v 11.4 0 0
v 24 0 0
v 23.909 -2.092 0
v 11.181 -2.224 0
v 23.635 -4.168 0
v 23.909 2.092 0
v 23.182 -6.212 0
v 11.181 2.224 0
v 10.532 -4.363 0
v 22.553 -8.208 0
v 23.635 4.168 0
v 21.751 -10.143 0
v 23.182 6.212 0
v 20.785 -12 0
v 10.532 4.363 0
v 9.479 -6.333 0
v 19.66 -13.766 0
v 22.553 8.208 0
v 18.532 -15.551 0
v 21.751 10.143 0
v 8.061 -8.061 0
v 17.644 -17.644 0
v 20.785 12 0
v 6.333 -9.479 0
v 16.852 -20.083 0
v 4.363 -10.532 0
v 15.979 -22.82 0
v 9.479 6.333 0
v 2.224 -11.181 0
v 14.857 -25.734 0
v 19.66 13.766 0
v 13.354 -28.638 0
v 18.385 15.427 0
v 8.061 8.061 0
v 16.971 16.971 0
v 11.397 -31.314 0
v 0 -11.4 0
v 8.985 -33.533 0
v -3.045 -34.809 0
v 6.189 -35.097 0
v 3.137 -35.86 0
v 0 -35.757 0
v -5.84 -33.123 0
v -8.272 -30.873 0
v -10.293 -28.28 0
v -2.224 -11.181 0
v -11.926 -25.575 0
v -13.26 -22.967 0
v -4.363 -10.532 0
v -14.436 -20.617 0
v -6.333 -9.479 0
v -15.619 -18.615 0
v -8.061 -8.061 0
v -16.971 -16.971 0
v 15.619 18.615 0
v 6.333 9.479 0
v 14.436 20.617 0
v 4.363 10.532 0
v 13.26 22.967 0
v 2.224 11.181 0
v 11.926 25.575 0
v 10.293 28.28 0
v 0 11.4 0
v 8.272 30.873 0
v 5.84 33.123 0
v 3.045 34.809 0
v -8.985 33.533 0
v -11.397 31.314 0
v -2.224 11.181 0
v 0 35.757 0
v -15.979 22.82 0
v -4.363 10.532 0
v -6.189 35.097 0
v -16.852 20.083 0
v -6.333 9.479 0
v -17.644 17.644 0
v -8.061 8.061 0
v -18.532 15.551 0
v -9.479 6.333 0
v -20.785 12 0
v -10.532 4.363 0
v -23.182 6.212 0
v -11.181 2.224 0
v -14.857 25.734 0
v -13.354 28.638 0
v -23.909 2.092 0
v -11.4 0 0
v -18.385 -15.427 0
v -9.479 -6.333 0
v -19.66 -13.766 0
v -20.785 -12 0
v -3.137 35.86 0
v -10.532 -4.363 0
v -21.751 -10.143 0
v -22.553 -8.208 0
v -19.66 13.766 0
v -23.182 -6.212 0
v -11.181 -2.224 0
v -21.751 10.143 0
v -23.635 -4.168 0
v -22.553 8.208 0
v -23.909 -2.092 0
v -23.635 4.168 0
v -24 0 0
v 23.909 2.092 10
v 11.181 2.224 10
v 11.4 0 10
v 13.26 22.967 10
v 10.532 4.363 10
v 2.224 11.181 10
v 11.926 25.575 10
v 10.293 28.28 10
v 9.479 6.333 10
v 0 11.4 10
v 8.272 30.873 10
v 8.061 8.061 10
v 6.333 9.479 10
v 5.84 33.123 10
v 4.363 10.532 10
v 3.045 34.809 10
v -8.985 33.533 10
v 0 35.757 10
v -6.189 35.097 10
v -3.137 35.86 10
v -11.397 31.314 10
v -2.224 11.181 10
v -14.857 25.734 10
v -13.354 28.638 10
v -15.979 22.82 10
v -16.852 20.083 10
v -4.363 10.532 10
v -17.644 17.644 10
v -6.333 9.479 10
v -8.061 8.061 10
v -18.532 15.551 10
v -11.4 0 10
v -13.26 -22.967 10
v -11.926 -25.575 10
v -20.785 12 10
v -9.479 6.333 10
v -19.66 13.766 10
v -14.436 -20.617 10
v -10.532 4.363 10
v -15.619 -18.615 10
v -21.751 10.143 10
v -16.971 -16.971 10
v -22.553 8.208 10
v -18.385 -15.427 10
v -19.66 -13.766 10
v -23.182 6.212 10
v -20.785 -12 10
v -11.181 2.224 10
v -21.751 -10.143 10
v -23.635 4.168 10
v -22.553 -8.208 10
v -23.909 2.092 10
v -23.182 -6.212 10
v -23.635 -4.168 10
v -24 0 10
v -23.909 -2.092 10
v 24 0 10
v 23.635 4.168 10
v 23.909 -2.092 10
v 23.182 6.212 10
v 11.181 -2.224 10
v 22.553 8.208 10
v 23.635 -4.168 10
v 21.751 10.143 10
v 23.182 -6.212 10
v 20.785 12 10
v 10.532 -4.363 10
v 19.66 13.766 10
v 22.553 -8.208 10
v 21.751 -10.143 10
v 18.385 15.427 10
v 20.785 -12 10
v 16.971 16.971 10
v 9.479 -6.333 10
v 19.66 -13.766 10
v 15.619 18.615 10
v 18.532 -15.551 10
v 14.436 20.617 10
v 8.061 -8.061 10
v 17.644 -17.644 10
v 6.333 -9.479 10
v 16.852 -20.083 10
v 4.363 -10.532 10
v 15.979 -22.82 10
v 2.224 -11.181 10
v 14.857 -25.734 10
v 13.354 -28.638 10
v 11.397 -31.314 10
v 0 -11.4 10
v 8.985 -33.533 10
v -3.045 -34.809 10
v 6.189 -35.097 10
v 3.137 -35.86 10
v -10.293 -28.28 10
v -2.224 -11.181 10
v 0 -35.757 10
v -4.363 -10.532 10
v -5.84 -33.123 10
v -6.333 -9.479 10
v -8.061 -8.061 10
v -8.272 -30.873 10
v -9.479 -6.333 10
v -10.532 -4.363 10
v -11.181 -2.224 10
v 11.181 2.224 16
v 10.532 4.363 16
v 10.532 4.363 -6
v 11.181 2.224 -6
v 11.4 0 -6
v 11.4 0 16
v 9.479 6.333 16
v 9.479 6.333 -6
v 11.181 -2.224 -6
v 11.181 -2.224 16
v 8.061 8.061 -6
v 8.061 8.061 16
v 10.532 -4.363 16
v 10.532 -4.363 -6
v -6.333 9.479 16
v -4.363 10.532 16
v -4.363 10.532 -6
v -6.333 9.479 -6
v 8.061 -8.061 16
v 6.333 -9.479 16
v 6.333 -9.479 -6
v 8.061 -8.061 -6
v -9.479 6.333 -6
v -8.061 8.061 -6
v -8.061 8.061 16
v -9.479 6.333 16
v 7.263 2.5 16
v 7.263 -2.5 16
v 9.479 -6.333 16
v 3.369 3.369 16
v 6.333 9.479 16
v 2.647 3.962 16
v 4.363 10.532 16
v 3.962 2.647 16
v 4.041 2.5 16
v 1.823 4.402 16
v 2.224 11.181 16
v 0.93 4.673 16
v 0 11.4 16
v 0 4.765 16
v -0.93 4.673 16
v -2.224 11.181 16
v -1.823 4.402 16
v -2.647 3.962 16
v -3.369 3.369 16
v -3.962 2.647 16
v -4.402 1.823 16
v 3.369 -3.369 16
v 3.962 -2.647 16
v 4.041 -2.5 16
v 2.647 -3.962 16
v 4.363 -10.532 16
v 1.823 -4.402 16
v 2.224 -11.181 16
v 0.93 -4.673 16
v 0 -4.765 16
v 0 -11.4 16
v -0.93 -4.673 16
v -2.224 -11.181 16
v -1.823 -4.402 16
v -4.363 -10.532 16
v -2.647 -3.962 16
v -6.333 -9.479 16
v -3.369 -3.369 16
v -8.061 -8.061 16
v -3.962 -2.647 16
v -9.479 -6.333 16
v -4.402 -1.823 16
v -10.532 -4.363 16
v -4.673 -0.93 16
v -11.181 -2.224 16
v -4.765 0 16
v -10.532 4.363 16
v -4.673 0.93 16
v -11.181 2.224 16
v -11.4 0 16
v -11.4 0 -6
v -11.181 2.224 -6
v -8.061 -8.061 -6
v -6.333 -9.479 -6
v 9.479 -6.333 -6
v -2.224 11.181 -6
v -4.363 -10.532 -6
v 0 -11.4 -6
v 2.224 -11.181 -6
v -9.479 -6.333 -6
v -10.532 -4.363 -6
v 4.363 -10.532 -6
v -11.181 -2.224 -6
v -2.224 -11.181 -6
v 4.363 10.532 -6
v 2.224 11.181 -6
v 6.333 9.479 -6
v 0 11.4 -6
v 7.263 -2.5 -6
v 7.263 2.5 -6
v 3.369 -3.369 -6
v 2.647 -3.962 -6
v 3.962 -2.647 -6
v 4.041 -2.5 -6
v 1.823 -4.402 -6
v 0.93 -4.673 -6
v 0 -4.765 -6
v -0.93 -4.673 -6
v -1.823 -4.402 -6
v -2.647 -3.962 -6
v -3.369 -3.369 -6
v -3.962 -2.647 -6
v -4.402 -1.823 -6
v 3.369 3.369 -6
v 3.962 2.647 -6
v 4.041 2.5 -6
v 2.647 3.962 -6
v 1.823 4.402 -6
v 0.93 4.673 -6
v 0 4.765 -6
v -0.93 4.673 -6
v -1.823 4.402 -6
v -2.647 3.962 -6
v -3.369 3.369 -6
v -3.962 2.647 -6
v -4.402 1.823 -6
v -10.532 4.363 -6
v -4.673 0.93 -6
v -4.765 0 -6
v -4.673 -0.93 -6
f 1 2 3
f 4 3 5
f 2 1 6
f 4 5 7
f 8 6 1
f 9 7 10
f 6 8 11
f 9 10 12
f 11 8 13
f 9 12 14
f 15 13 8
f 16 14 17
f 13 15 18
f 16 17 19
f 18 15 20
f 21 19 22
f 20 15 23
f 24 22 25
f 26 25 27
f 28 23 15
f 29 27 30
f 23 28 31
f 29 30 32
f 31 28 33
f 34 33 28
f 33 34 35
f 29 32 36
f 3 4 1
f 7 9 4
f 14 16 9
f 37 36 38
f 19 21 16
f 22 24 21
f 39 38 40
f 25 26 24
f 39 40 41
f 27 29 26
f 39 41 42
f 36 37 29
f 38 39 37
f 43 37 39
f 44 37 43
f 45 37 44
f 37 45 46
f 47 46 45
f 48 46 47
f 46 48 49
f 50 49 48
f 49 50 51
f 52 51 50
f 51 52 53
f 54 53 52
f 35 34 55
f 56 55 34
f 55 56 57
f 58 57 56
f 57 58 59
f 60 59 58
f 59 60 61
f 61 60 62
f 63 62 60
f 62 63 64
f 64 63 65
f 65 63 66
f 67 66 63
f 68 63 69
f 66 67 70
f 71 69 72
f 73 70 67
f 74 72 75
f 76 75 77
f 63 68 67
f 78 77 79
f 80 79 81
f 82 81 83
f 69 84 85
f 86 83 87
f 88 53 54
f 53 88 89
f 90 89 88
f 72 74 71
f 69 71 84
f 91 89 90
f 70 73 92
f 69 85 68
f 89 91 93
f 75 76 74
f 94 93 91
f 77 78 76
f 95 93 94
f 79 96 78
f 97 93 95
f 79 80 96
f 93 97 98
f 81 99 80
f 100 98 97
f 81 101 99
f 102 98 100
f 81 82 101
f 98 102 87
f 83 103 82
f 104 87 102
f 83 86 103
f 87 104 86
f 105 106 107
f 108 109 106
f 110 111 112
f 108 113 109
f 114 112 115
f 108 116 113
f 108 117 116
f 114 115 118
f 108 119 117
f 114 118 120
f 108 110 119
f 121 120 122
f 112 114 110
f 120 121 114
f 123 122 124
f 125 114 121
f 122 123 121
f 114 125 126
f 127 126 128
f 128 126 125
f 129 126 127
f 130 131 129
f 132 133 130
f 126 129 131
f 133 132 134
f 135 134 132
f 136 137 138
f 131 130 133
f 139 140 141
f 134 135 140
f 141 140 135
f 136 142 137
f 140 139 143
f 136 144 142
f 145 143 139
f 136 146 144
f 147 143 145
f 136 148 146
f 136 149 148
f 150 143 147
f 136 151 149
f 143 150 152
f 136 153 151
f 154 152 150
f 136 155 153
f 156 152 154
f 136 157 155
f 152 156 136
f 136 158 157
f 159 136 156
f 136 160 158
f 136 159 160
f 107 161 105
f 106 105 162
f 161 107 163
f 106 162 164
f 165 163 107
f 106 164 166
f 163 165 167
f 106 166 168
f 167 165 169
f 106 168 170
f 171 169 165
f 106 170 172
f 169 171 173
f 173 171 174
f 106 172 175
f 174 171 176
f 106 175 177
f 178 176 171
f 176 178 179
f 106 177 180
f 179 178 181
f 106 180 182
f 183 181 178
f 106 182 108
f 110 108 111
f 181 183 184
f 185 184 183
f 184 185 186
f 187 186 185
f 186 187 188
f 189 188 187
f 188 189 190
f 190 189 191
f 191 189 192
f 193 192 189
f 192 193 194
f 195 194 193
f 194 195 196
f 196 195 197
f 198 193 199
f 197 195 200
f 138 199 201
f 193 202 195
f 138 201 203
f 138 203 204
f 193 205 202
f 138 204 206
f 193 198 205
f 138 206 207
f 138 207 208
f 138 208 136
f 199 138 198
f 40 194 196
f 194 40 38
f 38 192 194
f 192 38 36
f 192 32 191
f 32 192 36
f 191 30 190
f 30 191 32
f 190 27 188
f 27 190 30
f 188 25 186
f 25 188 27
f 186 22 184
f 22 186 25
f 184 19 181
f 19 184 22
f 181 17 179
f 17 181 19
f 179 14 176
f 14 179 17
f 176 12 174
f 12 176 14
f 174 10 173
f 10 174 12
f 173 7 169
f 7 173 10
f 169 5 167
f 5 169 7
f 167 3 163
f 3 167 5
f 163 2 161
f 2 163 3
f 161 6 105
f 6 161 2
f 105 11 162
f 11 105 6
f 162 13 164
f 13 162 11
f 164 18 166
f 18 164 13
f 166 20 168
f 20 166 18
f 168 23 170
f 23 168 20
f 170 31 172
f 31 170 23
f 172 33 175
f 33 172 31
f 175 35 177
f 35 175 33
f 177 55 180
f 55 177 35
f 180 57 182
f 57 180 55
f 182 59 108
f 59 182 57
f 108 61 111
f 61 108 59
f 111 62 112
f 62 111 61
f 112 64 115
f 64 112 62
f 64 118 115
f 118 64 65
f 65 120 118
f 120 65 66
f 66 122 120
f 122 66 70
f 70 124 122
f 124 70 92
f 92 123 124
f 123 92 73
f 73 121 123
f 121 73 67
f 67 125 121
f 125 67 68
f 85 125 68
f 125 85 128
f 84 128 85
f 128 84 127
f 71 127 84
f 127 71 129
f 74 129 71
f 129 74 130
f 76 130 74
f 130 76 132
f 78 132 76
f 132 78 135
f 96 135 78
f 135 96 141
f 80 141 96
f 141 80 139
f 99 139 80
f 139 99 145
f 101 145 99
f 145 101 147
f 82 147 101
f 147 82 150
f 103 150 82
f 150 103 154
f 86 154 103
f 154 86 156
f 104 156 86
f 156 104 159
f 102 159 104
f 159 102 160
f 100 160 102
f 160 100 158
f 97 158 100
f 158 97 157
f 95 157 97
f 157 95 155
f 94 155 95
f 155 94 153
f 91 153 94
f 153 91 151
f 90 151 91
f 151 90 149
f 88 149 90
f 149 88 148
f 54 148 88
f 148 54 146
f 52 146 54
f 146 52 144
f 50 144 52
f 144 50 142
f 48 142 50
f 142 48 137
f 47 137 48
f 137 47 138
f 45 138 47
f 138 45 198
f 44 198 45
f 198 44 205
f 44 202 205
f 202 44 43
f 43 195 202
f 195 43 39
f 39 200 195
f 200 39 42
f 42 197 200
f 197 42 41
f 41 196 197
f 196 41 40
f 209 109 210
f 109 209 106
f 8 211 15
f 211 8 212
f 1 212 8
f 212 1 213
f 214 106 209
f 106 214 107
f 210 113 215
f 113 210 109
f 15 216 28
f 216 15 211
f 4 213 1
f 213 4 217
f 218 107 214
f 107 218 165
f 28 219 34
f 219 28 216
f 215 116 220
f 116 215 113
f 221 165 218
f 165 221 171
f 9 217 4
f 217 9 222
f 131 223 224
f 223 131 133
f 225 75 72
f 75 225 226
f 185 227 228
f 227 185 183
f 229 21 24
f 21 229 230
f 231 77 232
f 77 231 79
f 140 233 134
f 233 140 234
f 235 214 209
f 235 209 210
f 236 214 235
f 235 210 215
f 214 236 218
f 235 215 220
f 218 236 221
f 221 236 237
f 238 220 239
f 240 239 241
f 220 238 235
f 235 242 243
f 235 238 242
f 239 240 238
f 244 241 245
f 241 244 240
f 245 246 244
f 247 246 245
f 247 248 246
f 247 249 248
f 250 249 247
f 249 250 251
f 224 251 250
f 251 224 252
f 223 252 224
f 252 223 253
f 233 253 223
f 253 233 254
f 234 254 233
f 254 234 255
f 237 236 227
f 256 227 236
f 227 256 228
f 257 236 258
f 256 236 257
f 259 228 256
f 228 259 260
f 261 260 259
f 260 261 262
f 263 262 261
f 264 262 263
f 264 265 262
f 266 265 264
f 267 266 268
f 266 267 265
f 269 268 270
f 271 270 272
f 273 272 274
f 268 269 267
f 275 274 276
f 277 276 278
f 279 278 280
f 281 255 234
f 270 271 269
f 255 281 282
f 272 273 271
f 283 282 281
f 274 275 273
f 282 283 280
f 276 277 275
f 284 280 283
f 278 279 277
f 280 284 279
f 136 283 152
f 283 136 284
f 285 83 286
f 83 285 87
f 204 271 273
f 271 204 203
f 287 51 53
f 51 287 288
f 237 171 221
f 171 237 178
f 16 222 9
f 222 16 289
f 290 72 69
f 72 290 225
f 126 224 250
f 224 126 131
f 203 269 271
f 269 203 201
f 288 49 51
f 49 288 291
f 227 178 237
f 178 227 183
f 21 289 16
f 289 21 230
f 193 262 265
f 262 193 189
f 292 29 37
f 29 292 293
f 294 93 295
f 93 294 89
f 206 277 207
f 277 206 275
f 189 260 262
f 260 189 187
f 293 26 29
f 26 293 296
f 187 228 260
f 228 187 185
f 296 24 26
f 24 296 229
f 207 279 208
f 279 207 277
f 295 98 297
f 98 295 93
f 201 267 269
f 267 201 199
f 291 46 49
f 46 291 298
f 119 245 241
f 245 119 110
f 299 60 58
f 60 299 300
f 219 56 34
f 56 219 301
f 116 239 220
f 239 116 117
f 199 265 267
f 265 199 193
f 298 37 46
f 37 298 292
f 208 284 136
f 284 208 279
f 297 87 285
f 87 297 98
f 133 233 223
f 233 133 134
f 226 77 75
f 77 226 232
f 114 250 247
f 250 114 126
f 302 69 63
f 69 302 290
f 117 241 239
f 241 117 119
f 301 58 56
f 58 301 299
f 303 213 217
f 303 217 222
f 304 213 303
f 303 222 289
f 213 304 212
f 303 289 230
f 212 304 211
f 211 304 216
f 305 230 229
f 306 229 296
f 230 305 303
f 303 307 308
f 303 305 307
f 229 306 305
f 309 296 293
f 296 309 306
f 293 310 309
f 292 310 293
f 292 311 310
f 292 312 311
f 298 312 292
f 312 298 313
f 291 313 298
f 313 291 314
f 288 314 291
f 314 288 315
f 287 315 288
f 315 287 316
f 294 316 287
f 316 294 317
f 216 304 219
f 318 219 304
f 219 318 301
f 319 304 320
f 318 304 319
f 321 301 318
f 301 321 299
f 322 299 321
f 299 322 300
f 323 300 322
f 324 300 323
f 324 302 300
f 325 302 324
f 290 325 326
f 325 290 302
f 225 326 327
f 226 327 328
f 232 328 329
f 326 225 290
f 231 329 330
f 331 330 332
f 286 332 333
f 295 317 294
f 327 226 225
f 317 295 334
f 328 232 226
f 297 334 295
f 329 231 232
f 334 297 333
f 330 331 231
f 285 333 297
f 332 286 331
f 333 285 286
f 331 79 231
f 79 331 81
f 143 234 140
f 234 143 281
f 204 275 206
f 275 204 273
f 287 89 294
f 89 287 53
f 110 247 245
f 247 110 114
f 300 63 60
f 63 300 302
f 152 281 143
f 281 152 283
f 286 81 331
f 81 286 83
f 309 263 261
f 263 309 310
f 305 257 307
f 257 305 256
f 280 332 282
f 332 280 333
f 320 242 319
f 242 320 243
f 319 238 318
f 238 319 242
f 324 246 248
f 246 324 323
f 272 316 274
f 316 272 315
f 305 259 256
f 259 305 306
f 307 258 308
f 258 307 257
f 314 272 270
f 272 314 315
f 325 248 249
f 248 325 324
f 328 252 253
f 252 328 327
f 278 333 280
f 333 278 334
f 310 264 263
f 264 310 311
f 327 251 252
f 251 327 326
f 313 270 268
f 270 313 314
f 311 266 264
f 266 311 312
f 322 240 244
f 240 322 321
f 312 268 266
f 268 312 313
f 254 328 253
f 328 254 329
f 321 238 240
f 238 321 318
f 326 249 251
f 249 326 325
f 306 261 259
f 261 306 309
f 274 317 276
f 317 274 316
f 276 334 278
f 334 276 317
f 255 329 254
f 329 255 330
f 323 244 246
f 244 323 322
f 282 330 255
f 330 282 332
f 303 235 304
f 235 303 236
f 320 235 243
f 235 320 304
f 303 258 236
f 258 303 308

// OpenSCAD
$fn = 32;

// ----------------------------------------------------------------------
// Cam: base radius 24 mm with a 12 mm lift over 180 degrees
// ----------------------------------------------------------------------

// --- parameters (mm) ---
base_r = 24;              // base radius
lift = 12;                // lift height above the base radius
lift_span = 180;          // angular width of the lift
lift_start = 45;          // angle where the lift starts
cam_t = 10;               // cam plate thickness
hub_d = 22.8;             // hub diameter
hub_h = 22;               // hub height
bore_d = 9.53;            // bore
key_w = 5;                // keyway width
key_depth = 2.5;          // keyway depth

cam_profile = [[24, 0], [23.909, 2.092], [23.635, 4.168], [23.182, 6.212], [22.553, 8.208], [21.751, 10.143], [20.785, 12], [19.66, 13.766], [18.385, 15.427], [16.971, 16.971], [15.619, 18.615], [14.436, 20.617], [13.26, 22.967], [11.926, 25.575], [10.293, 28.28], [8.272, 30.873], [5.84, 33.123], [3.045, 34.809], [0, 35.757], [-3.137, 35.86], [-6.189, 35.097], [-8.985, 33.533], [-11.397, 31.314], [-13.354, 28.638], [-14.857, 25.734], [-15.979, 22.82], [-16.852, 20.083], [-17.644, 17.644], [-18.532, 15.551], [-19.66, 13.766], [-20.785, 12], [-21.751, 10.143], [-22.553, 8.208], [-23.182, 6.212], [-23.635, 4.168], [-23.909, 2.092], [-24, 0], [-23.909, -2.092], [-23.635, -4.168], [-23.182, -6.212], [-22.553, -8.208], [-21.751, -10.143], [-20.785, -12], [-19.66, -13.766], [-18.385, -15.427], [-16.971, -16.971], [-15.619, -18.615], [-14.436, -20.617], [-13.26, -22.967], [-11.926, -25.575], [-10.293, -28.28], [-8.272, -30.873], [-5.84, -33.123], [-3.045, -34.809], [0, -35.757], [3.137, -35.86], [6.189, -35.097], [8.985, -33.533], [11.397, -31.314], [13.354, -28.638], [14.857, -25.734], [15.979, -22.82], [16.852, -20.083], [17.644, -17.644], [18.532, -15.551], [19.66, -13.766], [20.785, -12], [21.751, -10.143], [22.553, -8.208], [23.182, -6.212], [23.635, -4.168], [23.909, -2.092]];

difference() {
  union() {
    linear_extrude(height = cam_t) polygon(cam_profile);
    /* hub, proud of the cam plate on both sides */
    translate([0, 0, -6]) cylinder(h = hub_h, d = hub_d);
  }
  /* bore through the hub, 2.5 mm clear on both faces */
  translate([0, 0, -8.5]) cylinder(h = hub_h + 5, d = bore_d);
  /* keyway, milled through the whole hub */
  translate([2.263, -2.5, -8.5]) cube([5, 5, 27]);
}
